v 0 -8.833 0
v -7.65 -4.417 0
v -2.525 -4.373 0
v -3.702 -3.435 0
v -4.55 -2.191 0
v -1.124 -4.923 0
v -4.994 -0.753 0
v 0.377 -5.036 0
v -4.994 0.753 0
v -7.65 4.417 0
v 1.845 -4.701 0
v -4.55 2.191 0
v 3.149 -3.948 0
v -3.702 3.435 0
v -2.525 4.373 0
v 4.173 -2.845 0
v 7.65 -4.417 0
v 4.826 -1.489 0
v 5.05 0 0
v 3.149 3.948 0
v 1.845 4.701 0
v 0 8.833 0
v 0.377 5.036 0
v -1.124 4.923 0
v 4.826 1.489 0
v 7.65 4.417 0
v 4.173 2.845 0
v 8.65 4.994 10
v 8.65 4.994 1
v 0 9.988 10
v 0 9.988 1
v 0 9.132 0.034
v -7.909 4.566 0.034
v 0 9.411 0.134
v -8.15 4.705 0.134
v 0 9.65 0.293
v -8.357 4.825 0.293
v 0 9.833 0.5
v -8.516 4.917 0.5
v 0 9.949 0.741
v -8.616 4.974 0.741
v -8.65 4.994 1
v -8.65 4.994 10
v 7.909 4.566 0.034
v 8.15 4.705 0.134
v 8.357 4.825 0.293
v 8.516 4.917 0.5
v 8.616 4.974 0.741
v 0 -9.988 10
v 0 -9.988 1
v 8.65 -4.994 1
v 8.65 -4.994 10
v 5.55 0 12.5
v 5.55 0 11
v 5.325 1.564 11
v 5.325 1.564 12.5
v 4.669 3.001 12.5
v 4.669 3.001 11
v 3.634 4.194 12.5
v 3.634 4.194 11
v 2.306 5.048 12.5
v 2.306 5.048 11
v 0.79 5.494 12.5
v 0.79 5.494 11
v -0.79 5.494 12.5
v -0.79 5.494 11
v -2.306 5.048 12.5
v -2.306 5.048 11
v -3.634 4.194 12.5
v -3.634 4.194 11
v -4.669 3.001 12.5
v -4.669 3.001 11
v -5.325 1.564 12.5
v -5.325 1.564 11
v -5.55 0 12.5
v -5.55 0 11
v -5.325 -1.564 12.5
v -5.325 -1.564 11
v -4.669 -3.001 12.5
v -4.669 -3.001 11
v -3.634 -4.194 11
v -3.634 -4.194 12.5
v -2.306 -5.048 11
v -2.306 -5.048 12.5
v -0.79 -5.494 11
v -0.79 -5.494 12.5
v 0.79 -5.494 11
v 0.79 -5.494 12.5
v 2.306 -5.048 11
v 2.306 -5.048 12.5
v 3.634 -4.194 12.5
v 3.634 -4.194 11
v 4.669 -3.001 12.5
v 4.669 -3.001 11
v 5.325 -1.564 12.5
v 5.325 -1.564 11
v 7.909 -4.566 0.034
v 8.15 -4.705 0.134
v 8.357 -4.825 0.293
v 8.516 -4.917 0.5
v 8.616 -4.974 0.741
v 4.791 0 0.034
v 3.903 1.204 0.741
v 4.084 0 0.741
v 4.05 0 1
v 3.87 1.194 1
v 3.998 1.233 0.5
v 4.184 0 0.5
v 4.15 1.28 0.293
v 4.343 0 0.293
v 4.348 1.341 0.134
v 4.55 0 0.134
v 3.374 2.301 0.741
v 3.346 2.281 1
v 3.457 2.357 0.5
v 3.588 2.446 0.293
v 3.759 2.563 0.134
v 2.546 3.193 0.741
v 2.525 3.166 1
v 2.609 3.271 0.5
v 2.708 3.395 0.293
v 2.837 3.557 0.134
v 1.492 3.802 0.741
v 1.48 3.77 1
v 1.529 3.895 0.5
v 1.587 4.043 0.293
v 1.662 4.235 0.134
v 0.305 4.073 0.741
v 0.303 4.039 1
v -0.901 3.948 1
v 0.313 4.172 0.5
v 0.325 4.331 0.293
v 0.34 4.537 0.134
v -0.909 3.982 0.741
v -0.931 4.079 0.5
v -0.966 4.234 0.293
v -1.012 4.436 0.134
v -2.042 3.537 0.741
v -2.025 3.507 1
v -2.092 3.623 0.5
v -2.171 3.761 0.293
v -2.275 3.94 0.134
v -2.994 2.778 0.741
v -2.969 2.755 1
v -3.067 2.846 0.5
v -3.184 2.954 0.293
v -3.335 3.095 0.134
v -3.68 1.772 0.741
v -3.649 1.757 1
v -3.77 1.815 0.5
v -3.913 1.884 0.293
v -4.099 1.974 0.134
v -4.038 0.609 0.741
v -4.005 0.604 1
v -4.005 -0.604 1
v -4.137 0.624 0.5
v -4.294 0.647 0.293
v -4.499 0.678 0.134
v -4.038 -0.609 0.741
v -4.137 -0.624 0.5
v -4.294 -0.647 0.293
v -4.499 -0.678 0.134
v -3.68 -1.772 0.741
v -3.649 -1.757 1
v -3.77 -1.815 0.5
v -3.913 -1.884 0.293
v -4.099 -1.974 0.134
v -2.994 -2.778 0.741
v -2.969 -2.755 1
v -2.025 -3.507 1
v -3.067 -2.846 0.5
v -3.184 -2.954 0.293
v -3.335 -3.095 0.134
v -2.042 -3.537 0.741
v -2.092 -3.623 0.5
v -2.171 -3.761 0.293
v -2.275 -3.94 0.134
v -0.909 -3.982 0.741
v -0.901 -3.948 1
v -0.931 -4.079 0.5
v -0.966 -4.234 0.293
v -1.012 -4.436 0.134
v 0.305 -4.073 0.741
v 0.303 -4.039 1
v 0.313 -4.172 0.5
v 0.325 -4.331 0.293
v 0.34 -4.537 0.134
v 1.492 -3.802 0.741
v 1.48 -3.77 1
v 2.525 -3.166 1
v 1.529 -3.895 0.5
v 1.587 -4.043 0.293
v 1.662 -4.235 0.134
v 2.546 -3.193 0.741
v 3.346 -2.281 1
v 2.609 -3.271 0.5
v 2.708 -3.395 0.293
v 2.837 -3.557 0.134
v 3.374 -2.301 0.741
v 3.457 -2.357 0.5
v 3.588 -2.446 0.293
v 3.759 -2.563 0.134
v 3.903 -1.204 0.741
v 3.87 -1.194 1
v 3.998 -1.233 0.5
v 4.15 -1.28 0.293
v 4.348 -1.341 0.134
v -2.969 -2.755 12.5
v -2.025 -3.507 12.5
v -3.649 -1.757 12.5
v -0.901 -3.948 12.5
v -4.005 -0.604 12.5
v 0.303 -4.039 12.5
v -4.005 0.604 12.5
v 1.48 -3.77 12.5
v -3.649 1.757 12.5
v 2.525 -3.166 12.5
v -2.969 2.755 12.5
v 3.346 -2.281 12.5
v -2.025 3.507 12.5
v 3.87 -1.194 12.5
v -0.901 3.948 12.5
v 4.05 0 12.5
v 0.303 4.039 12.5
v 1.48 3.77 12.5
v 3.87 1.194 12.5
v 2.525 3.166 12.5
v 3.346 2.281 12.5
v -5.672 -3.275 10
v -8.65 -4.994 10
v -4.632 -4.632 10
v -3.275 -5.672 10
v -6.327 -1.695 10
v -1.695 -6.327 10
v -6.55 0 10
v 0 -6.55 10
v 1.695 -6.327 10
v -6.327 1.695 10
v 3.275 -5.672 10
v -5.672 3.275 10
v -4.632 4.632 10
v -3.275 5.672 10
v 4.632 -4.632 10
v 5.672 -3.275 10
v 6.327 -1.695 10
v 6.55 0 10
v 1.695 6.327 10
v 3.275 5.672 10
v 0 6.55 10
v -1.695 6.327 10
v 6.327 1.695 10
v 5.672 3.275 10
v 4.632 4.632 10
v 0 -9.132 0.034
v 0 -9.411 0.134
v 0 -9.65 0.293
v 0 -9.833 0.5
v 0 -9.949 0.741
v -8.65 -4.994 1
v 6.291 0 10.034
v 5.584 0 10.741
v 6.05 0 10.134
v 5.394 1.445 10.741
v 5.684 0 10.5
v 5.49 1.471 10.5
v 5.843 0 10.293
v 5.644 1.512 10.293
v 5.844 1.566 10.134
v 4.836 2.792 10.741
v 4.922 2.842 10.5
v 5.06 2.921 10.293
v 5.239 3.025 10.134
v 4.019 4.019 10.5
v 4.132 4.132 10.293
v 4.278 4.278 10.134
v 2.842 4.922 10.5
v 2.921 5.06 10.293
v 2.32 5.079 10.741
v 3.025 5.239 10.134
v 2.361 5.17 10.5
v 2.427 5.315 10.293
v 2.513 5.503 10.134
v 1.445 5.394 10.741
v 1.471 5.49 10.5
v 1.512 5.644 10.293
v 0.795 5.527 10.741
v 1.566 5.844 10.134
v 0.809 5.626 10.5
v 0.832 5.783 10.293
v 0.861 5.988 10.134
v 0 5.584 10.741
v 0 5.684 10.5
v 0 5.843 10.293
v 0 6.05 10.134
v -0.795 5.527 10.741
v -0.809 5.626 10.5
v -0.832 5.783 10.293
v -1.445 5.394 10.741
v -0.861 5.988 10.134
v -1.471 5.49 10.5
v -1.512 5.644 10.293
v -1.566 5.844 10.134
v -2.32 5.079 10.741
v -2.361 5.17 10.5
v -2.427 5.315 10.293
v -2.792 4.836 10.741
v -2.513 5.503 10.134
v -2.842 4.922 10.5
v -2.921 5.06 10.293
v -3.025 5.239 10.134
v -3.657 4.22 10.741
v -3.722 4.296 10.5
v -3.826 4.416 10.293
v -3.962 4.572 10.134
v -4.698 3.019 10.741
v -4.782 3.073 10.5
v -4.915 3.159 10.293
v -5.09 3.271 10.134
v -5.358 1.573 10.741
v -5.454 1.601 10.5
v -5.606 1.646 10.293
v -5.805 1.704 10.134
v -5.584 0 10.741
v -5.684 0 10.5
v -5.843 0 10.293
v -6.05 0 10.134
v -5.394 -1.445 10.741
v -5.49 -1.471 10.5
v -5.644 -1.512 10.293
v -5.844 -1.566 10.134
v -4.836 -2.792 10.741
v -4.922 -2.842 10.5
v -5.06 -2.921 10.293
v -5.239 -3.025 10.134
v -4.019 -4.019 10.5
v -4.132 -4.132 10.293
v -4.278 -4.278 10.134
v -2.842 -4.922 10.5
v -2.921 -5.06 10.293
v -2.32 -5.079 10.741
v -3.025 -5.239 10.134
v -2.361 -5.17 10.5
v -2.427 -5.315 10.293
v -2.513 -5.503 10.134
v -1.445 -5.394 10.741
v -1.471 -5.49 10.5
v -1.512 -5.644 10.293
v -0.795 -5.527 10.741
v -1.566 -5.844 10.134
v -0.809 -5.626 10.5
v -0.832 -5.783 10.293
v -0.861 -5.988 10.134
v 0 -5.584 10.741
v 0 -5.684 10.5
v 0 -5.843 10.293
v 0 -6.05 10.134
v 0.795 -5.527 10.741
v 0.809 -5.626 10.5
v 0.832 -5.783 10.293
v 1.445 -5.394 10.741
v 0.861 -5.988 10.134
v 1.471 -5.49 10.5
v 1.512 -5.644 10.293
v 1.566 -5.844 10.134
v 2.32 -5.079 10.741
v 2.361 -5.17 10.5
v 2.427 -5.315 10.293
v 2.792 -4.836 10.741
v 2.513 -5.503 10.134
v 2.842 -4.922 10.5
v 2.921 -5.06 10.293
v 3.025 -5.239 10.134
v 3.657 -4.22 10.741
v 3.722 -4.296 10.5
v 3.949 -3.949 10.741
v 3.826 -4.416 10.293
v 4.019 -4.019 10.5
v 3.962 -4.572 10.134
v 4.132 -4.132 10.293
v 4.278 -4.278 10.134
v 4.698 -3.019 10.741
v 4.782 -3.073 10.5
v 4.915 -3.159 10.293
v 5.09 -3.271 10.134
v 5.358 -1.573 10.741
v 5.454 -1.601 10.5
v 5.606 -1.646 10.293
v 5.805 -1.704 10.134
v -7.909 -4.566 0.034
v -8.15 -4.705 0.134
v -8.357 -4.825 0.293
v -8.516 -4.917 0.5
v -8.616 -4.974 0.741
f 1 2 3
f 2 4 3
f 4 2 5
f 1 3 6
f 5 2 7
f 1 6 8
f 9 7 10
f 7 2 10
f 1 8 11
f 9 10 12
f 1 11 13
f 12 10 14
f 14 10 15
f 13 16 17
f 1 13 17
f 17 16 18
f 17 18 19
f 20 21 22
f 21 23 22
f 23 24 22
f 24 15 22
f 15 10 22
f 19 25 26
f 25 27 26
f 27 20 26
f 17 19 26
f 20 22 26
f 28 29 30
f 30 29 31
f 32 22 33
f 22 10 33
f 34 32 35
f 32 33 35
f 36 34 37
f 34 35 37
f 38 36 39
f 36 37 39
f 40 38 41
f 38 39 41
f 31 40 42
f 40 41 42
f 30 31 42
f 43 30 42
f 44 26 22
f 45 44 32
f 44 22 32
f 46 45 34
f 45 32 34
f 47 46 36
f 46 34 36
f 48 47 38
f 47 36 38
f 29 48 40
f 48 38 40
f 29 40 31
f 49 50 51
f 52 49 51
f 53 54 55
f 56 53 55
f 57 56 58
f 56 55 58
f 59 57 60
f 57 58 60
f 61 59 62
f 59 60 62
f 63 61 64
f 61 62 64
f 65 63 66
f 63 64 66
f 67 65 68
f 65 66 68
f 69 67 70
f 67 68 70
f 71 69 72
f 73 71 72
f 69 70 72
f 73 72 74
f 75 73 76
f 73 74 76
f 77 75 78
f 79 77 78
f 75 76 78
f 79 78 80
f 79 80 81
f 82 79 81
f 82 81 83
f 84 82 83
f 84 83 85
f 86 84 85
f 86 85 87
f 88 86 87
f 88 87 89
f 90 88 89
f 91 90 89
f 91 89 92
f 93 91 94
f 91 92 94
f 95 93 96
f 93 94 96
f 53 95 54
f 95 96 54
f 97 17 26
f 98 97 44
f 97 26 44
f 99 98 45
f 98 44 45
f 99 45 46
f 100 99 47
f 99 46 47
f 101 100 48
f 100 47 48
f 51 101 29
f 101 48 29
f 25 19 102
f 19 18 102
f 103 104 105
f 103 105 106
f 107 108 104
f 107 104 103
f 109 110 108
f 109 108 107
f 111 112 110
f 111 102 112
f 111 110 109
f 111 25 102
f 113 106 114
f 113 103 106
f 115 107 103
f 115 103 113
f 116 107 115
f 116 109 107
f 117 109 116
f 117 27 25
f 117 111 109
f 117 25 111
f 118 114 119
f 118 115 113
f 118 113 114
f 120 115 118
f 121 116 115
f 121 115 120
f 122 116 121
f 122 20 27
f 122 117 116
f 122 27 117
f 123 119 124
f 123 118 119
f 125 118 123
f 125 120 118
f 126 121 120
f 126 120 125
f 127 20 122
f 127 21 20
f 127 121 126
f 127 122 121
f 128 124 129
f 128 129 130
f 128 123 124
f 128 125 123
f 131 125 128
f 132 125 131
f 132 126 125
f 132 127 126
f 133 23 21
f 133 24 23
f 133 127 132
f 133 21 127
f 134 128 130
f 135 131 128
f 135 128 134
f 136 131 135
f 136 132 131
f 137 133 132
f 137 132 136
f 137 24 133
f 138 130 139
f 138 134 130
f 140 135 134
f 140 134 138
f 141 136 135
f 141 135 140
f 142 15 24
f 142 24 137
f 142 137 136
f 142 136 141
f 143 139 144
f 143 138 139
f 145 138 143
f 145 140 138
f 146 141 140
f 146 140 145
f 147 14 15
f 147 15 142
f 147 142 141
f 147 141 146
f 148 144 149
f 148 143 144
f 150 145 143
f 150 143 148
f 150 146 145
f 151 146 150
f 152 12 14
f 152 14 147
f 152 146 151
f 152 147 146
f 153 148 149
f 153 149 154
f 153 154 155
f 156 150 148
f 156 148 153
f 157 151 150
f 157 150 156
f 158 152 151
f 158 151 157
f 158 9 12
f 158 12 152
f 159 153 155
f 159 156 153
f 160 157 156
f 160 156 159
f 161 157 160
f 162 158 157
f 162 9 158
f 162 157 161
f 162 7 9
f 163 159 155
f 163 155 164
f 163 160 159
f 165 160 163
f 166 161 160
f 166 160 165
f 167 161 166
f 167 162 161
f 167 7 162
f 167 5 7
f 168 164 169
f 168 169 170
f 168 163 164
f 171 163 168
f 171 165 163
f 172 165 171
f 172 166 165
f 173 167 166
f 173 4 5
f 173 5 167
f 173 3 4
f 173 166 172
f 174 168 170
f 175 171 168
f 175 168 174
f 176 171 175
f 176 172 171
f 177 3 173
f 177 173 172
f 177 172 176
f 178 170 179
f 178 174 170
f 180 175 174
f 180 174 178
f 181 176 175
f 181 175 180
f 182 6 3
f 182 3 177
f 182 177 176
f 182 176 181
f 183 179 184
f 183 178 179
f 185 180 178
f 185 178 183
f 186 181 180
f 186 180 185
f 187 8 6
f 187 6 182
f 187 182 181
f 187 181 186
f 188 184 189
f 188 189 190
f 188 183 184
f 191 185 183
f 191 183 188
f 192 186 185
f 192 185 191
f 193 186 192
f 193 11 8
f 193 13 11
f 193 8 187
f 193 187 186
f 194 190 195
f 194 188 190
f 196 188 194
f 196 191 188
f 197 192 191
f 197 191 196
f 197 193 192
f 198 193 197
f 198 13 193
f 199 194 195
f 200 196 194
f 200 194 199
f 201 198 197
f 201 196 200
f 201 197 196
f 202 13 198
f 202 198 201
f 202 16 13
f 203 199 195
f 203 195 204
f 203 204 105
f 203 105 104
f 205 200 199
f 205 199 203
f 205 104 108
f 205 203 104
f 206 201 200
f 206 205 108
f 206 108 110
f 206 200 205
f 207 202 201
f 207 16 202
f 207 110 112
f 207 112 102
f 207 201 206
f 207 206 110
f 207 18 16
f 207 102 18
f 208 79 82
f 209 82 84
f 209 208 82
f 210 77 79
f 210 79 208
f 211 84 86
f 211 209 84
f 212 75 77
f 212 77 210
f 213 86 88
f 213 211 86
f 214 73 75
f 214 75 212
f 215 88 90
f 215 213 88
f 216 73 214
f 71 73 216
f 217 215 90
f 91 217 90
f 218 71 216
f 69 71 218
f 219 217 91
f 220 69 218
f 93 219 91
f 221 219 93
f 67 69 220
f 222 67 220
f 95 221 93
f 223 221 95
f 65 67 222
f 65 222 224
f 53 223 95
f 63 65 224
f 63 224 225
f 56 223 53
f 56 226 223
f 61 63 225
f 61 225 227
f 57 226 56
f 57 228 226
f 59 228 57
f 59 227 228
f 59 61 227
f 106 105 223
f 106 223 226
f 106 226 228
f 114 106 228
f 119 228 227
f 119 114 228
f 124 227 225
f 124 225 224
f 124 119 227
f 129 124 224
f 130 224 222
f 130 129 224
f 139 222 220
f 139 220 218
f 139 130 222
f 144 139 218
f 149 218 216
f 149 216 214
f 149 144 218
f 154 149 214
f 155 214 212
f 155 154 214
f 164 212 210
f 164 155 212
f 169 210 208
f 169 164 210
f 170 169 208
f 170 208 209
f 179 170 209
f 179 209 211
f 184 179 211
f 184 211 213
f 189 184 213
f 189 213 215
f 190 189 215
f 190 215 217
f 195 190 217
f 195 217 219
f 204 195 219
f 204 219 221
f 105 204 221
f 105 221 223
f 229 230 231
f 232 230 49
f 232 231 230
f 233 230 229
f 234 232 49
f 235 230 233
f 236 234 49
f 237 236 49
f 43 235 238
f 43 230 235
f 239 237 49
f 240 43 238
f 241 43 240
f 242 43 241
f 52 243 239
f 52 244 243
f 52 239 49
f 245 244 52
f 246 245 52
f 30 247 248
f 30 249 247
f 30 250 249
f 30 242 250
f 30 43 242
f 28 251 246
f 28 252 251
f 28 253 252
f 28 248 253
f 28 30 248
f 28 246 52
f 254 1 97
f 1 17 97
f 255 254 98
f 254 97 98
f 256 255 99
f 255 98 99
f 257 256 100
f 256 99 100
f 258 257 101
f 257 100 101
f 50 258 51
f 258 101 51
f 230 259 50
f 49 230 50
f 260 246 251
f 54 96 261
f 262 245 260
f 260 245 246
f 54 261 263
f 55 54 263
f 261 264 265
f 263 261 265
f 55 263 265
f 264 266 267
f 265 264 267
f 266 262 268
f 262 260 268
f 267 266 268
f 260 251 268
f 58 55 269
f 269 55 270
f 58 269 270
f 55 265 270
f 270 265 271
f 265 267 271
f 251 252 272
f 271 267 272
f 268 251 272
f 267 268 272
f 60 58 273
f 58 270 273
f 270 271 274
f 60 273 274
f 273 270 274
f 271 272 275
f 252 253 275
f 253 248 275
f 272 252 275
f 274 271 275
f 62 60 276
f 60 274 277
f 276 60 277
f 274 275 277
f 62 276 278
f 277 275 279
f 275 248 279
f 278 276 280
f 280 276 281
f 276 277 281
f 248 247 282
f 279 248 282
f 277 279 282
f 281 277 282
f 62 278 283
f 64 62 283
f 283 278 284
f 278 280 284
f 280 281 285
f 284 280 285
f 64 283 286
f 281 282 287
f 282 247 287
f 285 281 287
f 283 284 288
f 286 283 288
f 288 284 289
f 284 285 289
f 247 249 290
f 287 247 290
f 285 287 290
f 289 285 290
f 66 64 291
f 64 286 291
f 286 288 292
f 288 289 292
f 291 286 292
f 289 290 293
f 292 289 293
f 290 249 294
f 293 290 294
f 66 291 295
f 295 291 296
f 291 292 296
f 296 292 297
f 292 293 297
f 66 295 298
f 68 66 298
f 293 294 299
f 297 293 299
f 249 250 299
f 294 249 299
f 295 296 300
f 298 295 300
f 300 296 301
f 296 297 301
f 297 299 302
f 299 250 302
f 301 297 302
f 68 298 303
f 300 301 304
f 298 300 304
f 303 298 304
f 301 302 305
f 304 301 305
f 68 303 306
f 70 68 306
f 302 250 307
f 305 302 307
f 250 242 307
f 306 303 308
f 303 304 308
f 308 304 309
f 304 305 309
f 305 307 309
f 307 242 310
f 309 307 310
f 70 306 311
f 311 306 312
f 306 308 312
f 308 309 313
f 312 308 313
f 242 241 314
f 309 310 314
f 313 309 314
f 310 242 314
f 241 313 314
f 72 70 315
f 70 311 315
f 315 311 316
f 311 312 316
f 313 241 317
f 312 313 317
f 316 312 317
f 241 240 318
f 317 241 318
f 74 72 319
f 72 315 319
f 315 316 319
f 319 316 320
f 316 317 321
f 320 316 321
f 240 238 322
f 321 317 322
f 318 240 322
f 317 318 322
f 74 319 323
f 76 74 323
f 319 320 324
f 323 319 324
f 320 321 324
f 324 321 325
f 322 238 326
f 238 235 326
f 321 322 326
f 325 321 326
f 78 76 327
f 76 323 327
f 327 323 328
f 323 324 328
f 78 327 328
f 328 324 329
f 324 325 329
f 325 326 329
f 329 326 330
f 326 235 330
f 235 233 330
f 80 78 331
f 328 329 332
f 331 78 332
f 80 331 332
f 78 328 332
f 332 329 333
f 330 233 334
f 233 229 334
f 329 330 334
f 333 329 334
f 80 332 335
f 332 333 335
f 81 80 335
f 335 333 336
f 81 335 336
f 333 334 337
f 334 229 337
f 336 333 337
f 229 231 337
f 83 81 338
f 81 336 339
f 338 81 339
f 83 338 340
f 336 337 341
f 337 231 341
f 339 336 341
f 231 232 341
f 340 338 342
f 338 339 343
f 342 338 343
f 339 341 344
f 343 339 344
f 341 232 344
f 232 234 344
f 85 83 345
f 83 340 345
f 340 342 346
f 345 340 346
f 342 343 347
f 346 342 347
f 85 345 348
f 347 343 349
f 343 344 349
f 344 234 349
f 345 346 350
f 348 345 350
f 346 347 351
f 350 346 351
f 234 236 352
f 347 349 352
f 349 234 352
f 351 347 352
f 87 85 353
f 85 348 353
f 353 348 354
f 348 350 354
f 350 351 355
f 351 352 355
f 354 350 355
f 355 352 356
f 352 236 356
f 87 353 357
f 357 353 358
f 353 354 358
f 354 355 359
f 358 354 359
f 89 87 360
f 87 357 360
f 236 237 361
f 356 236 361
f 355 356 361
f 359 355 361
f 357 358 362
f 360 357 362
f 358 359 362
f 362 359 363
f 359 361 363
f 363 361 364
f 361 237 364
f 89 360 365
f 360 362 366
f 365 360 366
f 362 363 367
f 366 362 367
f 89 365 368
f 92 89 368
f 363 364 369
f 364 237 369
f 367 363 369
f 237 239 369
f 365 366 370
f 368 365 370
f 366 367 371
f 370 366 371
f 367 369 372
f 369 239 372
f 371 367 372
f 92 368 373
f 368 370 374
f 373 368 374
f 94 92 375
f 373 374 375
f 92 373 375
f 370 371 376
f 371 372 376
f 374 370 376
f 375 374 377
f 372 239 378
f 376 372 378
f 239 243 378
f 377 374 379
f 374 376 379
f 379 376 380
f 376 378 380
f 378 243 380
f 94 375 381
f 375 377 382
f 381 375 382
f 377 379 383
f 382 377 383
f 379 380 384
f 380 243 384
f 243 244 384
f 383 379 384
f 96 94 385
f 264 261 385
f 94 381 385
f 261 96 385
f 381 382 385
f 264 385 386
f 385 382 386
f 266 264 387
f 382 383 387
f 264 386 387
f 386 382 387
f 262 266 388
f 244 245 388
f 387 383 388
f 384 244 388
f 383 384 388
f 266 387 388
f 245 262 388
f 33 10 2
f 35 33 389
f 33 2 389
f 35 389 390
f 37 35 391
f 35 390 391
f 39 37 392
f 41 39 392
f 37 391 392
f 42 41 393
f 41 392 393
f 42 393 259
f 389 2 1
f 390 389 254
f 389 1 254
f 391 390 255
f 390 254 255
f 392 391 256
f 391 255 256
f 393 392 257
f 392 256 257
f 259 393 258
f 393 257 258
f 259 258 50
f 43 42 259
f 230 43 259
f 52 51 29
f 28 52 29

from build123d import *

# Parameters (mm, degrees)
SKETCH1_R           = 4.05
BOSS_EXTRUDE1_DEPTH = 10
SKETCH2_R           = 5.55
SKETCH2_R_2         = 4.05
BOSS_EXTRUDE2_DEPTH = 2.5
FILLET1_R           = 1


with BuildPart() as part:
    # Sketch1 → Boss-Extrude1 (new body)
    with BuildSketch(Plane.XY):
        Polygon((8.65, -4.994079828), (8.65, 4.994079828), (0, 9.988159657), (-8.65, 4.994079828), (-8.65, -4.994079828), (0, -9.988159657), align=None)
        Circle(SKETCH1_R, mode=Mode.SUBTRACT)
    extrude(amount=BOSS_EXTRUDE1_DEPTH)

    # Sketch2 → Boss-Extrude2 (add)
    with BuildSketch(Plane.XY.offset(10)):
        Circle(SKETCH2_R)
        Circle(SKETCH2_R_2, mode=Mode.SUBTRACT)
    extrude(amount=BOSS_EXTRUDE2_DEPTH)

    # Fillet1
    fillet1_edges = [part.edges().sort_by_distance(p)[0] for p in [
        (-4.05, 0, 0),
        (-5.55, 0, 10),
        (-4.325, -7.491119743, 0),
        (-8.65, 0, 0),
        (-4.325, 7.491119743, 0),
        (4.325, 7.491119743, 0),
        (8.65, 0, 0),
        (4.325, -7.491119743, 0),
    ]]
    fillet(fillet1_edges, radius=FILLET1_R)


solid = part.part
